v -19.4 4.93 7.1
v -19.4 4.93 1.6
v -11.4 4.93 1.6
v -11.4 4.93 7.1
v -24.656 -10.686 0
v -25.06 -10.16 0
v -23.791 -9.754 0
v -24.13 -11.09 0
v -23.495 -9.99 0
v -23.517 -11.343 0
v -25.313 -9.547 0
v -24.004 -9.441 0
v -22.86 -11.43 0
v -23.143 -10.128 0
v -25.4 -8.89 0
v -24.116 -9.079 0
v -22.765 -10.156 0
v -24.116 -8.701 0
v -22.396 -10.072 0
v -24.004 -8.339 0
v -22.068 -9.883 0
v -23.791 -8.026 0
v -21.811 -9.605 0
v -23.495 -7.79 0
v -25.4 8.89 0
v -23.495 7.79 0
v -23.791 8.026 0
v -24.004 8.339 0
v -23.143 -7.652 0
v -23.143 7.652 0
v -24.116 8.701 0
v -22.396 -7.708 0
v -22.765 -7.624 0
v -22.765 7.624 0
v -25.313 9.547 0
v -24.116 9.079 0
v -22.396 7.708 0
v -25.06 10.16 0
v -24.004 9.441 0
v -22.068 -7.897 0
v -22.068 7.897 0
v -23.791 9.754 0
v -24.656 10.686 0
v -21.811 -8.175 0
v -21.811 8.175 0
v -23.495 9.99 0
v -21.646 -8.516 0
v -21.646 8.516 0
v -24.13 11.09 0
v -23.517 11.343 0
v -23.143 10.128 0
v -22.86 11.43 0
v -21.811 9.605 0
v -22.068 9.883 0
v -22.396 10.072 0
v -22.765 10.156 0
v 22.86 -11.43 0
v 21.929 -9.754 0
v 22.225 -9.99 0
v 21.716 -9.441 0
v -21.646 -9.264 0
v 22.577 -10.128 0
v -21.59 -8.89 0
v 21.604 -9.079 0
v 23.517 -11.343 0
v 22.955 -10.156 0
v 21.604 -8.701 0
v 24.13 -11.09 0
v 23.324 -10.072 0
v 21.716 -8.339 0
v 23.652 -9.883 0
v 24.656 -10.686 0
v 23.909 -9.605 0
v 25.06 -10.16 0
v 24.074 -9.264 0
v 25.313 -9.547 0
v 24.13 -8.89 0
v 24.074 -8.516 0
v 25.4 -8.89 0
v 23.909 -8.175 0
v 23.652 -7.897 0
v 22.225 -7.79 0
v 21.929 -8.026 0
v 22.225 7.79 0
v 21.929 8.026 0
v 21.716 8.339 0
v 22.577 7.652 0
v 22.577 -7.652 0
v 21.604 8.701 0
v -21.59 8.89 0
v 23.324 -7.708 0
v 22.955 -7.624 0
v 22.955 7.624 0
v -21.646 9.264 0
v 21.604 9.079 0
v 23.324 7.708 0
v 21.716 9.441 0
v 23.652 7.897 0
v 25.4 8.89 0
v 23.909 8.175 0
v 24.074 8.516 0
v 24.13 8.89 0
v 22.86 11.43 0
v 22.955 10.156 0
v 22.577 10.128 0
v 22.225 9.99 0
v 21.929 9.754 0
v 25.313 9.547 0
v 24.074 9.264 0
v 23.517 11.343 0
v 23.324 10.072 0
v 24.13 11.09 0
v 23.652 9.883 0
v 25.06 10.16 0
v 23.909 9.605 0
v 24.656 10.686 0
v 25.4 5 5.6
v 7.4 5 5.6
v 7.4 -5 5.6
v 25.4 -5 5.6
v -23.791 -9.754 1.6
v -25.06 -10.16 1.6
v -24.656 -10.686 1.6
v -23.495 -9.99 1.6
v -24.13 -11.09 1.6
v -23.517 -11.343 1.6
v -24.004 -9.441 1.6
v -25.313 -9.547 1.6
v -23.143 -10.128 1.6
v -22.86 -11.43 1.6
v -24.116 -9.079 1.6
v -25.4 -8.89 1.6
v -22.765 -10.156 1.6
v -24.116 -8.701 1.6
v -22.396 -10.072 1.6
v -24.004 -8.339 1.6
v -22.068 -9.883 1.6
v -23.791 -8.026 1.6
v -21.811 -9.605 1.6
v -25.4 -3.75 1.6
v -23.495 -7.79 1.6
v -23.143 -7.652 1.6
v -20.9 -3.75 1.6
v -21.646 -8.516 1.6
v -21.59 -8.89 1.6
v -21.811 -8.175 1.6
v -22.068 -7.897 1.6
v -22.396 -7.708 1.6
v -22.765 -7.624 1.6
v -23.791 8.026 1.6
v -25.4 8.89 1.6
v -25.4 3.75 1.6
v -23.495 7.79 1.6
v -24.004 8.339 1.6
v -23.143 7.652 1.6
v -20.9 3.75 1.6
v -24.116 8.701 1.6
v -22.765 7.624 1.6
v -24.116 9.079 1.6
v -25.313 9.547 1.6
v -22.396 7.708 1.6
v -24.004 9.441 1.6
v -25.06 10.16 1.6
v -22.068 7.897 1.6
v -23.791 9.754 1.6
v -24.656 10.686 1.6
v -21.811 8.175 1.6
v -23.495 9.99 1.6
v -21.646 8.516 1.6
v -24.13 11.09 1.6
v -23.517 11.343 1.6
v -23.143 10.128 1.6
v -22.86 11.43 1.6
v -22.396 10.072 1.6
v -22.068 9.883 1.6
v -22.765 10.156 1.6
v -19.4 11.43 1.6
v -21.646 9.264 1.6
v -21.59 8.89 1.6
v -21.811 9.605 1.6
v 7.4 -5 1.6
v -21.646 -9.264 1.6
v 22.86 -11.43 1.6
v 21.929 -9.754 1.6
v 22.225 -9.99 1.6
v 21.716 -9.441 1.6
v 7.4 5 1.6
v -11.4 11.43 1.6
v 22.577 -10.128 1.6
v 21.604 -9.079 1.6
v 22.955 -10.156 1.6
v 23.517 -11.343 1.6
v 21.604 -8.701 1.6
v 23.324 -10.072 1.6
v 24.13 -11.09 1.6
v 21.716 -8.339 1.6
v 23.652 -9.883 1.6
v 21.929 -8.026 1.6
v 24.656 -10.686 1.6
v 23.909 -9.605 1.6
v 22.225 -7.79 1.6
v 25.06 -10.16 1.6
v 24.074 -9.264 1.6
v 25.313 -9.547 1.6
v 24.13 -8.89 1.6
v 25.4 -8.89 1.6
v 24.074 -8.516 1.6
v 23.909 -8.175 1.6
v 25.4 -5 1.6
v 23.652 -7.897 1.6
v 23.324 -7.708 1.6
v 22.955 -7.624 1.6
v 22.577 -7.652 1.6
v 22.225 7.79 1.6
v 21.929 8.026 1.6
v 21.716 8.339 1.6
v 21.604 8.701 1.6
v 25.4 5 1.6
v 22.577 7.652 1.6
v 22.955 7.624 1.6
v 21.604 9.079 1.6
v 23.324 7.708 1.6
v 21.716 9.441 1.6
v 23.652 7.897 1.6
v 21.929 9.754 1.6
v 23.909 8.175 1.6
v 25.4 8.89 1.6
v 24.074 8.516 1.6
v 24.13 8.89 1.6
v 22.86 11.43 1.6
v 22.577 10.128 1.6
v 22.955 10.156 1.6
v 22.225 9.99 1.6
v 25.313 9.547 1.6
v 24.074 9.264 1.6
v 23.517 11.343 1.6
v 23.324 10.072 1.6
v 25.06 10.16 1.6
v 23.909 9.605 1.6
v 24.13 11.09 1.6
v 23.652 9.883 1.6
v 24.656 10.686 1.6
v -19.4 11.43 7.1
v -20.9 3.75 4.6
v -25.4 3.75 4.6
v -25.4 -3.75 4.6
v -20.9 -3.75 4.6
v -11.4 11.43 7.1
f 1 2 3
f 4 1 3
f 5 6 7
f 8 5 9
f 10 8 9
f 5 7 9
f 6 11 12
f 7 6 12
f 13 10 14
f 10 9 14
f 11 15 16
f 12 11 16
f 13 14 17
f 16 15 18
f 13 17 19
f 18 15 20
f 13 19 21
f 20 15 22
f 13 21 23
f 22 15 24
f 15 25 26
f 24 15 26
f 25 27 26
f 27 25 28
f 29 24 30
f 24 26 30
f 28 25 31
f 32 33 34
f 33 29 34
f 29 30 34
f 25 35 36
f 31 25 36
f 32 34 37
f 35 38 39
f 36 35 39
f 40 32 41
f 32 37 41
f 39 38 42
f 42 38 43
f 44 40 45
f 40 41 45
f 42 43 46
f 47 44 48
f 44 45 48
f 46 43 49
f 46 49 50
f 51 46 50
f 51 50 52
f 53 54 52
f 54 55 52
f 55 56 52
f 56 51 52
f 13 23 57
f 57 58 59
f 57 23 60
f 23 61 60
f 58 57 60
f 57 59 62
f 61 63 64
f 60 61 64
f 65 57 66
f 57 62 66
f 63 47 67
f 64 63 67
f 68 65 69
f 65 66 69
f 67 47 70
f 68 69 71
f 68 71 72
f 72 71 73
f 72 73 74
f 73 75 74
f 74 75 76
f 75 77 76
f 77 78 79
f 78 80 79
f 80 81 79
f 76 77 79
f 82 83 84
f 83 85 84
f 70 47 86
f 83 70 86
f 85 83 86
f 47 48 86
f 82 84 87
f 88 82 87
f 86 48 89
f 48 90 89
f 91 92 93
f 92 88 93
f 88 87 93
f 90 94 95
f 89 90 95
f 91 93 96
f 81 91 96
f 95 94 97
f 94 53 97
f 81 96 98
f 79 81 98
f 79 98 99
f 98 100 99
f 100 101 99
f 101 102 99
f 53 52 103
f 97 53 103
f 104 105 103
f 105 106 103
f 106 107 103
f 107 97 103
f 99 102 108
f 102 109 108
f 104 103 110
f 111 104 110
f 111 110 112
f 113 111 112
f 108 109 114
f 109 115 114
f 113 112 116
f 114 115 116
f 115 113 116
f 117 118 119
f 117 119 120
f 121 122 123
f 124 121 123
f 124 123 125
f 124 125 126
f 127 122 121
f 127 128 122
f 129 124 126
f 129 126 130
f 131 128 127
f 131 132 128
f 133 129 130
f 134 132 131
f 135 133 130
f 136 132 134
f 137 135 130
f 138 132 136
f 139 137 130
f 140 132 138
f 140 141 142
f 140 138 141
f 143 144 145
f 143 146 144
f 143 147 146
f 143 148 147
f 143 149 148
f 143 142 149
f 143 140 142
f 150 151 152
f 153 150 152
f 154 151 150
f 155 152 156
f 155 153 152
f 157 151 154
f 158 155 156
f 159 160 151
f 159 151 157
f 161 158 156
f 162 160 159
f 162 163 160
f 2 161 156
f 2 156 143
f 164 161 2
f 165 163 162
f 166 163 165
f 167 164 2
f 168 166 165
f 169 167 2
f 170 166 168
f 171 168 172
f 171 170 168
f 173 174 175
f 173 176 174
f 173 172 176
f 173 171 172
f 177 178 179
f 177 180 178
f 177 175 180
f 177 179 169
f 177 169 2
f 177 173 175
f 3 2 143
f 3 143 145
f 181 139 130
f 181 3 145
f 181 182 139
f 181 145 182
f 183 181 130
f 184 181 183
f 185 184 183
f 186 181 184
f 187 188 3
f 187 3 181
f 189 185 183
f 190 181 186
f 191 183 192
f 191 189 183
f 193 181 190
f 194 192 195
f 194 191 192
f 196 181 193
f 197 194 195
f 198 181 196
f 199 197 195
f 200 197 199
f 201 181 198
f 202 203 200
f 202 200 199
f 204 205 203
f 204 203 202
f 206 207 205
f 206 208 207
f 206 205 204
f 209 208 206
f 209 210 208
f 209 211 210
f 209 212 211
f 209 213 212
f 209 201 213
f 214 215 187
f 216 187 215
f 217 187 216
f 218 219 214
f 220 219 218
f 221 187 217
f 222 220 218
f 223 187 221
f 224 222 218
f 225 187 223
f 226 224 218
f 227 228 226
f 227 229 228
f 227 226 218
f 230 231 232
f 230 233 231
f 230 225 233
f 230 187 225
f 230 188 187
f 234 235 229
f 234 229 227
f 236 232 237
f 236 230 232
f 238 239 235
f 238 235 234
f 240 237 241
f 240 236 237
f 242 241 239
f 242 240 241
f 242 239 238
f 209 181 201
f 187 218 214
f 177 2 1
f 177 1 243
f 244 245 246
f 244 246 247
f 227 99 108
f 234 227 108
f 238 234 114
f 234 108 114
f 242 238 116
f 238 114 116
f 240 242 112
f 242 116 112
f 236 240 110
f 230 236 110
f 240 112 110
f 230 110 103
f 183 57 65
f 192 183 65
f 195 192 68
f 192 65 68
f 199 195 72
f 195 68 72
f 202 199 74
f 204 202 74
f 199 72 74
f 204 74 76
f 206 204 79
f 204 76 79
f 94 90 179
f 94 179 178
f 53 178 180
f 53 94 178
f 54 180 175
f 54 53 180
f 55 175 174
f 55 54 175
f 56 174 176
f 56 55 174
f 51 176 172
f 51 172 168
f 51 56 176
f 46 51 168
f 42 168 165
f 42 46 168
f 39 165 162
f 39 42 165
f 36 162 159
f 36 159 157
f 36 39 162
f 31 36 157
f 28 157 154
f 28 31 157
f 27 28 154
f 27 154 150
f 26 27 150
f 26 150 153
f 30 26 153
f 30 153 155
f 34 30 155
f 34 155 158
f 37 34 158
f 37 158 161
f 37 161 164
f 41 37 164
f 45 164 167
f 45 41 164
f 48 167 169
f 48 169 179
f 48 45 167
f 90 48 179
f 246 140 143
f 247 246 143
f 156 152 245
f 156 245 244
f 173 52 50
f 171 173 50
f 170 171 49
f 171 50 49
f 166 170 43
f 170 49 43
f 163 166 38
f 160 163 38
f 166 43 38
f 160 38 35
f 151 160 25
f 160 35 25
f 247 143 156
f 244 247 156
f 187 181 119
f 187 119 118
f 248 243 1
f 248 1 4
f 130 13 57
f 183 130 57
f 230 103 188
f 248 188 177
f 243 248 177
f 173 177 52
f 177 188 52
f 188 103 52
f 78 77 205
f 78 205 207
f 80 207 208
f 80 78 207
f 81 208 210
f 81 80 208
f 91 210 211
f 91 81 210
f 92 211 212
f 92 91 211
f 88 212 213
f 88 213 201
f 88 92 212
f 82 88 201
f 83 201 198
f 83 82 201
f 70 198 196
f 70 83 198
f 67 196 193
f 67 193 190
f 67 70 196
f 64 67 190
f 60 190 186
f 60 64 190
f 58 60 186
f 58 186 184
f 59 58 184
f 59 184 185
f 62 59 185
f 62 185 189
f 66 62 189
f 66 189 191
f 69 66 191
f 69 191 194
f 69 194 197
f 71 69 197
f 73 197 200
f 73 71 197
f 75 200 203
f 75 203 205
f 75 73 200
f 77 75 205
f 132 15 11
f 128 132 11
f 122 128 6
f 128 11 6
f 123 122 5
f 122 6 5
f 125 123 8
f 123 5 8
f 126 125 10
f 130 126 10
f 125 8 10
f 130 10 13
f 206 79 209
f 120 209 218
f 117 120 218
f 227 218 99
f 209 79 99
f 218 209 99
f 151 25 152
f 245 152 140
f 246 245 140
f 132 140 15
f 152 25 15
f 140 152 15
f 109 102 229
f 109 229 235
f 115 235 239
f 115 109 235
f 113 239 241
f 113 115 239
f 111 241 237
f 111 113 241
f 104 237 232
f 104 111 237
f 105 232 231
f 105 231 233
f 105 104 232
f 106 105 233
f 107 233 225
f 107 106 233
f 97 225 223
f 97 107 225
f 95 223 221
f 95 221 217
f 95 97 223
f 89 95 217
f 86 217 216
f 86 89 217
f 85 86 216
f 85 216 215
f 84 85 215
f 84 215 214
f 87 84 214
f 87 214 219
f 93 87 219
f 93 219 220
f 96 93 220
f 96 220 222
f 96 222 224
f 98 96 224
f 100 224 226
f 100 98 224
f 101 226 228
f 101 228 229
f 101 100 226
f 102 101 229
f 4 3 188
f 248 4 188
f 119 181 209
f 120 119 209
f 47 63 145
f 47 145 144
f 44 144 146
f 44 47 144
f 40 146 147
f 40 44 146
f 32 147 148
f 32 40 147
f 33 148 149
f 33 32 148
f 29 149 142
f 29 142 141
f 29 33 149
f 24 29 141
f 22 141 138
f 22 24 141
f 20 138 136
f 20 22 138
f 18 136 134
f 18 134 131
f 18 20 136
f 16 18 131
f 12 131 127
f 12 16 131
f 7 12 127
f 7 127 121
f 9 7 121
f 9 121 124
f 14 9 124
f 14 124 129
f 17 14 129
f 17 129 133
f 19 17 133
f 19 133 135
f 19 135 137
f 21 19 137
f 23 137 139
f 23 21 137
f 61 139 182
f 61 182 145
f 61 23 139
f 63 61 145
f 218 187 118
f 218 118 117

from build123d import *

# Parameters (mm, degrees)
F0_R     = 1.27
F1_DEPTH = 1.6
F2_W     = 4.5
F2_H     = 7.5
F3_DEPTH = 3
F4_W     = 18
F4_H     = 10
F5_DEPTH = 4
F6_W     = 8
F6_H     = 6.5
F7_DEPTH = 5.5


with BuildPart() as f1:
    # F0 (on Top) → F1 (new body)
    with BuildSketch(Plane.XY):
        with BuildLine():
            ThreePointArc((25.4, 8.89), (24.656051, 10.686051), (22.86, 11.43))
            Line((22.86, 11.43), (-22.86, 11.43))
            ThreePointArc((-22.86, 11.43), (-24.656051, 10.686051), (-25.4, 8.89))
            Line((-25.4, 8.89), (-25.4, -8.89))
            ThreePointArc((-25.4, -8.89), (-24.656051, -10.686051), (-22.86, -11.43))
            Line((-22.86, -11.43), (22.86, -11.43))
            ThreePointArc((22.86, -11.43), (24.656051, -10.686051), (25.4, -8.89))
            Line((25.4, -8.89), (25.4, 8.89))
        make_face()
        with Locations((-22.86, -8.89)):
            Circle(F0_R, mode=Mode.SUBTRACT)
        with Locations((22.86, -8.89)):
            Circle(F0_R, mode=Mode.SUBTRACT)
        with Locations((-22.86, 8.89)):
            Circle(F0_R, mode=Mode.SUBTRACT)
        with Locations((22.86, 8.89)):
            Circle(F0_R, mode=Mode.SUBTRACT)
    extrude(amount=F1_DEPTH)

    # F2 (on face) → F3 (join)
    with BuildSketch(Plane.XY.offset(1.6)):
        with Locations((-23.15, 0)):
            Rectangle(F2_W, F2_H)
    extrude(amount=F3_DEPTH)

    # F4 (on face) → F5 (join)
    with BuildSketch(Plane.XY.offset(1.6)):
        with Locations((16.4, 0)):
            Rectangle(F4_W, F4_H)
    extrude(amount=F5_DEPTH)

    # F6 (on face) → F7 (join)
    with BuildSketch(Plane.XY.offset(1.6)):
        with Locations((-15.4, 8.18)):
            Rectangle(F6_W, F6_H)
    extrude(amount=F7_DEPTH)


solid = f1.part
